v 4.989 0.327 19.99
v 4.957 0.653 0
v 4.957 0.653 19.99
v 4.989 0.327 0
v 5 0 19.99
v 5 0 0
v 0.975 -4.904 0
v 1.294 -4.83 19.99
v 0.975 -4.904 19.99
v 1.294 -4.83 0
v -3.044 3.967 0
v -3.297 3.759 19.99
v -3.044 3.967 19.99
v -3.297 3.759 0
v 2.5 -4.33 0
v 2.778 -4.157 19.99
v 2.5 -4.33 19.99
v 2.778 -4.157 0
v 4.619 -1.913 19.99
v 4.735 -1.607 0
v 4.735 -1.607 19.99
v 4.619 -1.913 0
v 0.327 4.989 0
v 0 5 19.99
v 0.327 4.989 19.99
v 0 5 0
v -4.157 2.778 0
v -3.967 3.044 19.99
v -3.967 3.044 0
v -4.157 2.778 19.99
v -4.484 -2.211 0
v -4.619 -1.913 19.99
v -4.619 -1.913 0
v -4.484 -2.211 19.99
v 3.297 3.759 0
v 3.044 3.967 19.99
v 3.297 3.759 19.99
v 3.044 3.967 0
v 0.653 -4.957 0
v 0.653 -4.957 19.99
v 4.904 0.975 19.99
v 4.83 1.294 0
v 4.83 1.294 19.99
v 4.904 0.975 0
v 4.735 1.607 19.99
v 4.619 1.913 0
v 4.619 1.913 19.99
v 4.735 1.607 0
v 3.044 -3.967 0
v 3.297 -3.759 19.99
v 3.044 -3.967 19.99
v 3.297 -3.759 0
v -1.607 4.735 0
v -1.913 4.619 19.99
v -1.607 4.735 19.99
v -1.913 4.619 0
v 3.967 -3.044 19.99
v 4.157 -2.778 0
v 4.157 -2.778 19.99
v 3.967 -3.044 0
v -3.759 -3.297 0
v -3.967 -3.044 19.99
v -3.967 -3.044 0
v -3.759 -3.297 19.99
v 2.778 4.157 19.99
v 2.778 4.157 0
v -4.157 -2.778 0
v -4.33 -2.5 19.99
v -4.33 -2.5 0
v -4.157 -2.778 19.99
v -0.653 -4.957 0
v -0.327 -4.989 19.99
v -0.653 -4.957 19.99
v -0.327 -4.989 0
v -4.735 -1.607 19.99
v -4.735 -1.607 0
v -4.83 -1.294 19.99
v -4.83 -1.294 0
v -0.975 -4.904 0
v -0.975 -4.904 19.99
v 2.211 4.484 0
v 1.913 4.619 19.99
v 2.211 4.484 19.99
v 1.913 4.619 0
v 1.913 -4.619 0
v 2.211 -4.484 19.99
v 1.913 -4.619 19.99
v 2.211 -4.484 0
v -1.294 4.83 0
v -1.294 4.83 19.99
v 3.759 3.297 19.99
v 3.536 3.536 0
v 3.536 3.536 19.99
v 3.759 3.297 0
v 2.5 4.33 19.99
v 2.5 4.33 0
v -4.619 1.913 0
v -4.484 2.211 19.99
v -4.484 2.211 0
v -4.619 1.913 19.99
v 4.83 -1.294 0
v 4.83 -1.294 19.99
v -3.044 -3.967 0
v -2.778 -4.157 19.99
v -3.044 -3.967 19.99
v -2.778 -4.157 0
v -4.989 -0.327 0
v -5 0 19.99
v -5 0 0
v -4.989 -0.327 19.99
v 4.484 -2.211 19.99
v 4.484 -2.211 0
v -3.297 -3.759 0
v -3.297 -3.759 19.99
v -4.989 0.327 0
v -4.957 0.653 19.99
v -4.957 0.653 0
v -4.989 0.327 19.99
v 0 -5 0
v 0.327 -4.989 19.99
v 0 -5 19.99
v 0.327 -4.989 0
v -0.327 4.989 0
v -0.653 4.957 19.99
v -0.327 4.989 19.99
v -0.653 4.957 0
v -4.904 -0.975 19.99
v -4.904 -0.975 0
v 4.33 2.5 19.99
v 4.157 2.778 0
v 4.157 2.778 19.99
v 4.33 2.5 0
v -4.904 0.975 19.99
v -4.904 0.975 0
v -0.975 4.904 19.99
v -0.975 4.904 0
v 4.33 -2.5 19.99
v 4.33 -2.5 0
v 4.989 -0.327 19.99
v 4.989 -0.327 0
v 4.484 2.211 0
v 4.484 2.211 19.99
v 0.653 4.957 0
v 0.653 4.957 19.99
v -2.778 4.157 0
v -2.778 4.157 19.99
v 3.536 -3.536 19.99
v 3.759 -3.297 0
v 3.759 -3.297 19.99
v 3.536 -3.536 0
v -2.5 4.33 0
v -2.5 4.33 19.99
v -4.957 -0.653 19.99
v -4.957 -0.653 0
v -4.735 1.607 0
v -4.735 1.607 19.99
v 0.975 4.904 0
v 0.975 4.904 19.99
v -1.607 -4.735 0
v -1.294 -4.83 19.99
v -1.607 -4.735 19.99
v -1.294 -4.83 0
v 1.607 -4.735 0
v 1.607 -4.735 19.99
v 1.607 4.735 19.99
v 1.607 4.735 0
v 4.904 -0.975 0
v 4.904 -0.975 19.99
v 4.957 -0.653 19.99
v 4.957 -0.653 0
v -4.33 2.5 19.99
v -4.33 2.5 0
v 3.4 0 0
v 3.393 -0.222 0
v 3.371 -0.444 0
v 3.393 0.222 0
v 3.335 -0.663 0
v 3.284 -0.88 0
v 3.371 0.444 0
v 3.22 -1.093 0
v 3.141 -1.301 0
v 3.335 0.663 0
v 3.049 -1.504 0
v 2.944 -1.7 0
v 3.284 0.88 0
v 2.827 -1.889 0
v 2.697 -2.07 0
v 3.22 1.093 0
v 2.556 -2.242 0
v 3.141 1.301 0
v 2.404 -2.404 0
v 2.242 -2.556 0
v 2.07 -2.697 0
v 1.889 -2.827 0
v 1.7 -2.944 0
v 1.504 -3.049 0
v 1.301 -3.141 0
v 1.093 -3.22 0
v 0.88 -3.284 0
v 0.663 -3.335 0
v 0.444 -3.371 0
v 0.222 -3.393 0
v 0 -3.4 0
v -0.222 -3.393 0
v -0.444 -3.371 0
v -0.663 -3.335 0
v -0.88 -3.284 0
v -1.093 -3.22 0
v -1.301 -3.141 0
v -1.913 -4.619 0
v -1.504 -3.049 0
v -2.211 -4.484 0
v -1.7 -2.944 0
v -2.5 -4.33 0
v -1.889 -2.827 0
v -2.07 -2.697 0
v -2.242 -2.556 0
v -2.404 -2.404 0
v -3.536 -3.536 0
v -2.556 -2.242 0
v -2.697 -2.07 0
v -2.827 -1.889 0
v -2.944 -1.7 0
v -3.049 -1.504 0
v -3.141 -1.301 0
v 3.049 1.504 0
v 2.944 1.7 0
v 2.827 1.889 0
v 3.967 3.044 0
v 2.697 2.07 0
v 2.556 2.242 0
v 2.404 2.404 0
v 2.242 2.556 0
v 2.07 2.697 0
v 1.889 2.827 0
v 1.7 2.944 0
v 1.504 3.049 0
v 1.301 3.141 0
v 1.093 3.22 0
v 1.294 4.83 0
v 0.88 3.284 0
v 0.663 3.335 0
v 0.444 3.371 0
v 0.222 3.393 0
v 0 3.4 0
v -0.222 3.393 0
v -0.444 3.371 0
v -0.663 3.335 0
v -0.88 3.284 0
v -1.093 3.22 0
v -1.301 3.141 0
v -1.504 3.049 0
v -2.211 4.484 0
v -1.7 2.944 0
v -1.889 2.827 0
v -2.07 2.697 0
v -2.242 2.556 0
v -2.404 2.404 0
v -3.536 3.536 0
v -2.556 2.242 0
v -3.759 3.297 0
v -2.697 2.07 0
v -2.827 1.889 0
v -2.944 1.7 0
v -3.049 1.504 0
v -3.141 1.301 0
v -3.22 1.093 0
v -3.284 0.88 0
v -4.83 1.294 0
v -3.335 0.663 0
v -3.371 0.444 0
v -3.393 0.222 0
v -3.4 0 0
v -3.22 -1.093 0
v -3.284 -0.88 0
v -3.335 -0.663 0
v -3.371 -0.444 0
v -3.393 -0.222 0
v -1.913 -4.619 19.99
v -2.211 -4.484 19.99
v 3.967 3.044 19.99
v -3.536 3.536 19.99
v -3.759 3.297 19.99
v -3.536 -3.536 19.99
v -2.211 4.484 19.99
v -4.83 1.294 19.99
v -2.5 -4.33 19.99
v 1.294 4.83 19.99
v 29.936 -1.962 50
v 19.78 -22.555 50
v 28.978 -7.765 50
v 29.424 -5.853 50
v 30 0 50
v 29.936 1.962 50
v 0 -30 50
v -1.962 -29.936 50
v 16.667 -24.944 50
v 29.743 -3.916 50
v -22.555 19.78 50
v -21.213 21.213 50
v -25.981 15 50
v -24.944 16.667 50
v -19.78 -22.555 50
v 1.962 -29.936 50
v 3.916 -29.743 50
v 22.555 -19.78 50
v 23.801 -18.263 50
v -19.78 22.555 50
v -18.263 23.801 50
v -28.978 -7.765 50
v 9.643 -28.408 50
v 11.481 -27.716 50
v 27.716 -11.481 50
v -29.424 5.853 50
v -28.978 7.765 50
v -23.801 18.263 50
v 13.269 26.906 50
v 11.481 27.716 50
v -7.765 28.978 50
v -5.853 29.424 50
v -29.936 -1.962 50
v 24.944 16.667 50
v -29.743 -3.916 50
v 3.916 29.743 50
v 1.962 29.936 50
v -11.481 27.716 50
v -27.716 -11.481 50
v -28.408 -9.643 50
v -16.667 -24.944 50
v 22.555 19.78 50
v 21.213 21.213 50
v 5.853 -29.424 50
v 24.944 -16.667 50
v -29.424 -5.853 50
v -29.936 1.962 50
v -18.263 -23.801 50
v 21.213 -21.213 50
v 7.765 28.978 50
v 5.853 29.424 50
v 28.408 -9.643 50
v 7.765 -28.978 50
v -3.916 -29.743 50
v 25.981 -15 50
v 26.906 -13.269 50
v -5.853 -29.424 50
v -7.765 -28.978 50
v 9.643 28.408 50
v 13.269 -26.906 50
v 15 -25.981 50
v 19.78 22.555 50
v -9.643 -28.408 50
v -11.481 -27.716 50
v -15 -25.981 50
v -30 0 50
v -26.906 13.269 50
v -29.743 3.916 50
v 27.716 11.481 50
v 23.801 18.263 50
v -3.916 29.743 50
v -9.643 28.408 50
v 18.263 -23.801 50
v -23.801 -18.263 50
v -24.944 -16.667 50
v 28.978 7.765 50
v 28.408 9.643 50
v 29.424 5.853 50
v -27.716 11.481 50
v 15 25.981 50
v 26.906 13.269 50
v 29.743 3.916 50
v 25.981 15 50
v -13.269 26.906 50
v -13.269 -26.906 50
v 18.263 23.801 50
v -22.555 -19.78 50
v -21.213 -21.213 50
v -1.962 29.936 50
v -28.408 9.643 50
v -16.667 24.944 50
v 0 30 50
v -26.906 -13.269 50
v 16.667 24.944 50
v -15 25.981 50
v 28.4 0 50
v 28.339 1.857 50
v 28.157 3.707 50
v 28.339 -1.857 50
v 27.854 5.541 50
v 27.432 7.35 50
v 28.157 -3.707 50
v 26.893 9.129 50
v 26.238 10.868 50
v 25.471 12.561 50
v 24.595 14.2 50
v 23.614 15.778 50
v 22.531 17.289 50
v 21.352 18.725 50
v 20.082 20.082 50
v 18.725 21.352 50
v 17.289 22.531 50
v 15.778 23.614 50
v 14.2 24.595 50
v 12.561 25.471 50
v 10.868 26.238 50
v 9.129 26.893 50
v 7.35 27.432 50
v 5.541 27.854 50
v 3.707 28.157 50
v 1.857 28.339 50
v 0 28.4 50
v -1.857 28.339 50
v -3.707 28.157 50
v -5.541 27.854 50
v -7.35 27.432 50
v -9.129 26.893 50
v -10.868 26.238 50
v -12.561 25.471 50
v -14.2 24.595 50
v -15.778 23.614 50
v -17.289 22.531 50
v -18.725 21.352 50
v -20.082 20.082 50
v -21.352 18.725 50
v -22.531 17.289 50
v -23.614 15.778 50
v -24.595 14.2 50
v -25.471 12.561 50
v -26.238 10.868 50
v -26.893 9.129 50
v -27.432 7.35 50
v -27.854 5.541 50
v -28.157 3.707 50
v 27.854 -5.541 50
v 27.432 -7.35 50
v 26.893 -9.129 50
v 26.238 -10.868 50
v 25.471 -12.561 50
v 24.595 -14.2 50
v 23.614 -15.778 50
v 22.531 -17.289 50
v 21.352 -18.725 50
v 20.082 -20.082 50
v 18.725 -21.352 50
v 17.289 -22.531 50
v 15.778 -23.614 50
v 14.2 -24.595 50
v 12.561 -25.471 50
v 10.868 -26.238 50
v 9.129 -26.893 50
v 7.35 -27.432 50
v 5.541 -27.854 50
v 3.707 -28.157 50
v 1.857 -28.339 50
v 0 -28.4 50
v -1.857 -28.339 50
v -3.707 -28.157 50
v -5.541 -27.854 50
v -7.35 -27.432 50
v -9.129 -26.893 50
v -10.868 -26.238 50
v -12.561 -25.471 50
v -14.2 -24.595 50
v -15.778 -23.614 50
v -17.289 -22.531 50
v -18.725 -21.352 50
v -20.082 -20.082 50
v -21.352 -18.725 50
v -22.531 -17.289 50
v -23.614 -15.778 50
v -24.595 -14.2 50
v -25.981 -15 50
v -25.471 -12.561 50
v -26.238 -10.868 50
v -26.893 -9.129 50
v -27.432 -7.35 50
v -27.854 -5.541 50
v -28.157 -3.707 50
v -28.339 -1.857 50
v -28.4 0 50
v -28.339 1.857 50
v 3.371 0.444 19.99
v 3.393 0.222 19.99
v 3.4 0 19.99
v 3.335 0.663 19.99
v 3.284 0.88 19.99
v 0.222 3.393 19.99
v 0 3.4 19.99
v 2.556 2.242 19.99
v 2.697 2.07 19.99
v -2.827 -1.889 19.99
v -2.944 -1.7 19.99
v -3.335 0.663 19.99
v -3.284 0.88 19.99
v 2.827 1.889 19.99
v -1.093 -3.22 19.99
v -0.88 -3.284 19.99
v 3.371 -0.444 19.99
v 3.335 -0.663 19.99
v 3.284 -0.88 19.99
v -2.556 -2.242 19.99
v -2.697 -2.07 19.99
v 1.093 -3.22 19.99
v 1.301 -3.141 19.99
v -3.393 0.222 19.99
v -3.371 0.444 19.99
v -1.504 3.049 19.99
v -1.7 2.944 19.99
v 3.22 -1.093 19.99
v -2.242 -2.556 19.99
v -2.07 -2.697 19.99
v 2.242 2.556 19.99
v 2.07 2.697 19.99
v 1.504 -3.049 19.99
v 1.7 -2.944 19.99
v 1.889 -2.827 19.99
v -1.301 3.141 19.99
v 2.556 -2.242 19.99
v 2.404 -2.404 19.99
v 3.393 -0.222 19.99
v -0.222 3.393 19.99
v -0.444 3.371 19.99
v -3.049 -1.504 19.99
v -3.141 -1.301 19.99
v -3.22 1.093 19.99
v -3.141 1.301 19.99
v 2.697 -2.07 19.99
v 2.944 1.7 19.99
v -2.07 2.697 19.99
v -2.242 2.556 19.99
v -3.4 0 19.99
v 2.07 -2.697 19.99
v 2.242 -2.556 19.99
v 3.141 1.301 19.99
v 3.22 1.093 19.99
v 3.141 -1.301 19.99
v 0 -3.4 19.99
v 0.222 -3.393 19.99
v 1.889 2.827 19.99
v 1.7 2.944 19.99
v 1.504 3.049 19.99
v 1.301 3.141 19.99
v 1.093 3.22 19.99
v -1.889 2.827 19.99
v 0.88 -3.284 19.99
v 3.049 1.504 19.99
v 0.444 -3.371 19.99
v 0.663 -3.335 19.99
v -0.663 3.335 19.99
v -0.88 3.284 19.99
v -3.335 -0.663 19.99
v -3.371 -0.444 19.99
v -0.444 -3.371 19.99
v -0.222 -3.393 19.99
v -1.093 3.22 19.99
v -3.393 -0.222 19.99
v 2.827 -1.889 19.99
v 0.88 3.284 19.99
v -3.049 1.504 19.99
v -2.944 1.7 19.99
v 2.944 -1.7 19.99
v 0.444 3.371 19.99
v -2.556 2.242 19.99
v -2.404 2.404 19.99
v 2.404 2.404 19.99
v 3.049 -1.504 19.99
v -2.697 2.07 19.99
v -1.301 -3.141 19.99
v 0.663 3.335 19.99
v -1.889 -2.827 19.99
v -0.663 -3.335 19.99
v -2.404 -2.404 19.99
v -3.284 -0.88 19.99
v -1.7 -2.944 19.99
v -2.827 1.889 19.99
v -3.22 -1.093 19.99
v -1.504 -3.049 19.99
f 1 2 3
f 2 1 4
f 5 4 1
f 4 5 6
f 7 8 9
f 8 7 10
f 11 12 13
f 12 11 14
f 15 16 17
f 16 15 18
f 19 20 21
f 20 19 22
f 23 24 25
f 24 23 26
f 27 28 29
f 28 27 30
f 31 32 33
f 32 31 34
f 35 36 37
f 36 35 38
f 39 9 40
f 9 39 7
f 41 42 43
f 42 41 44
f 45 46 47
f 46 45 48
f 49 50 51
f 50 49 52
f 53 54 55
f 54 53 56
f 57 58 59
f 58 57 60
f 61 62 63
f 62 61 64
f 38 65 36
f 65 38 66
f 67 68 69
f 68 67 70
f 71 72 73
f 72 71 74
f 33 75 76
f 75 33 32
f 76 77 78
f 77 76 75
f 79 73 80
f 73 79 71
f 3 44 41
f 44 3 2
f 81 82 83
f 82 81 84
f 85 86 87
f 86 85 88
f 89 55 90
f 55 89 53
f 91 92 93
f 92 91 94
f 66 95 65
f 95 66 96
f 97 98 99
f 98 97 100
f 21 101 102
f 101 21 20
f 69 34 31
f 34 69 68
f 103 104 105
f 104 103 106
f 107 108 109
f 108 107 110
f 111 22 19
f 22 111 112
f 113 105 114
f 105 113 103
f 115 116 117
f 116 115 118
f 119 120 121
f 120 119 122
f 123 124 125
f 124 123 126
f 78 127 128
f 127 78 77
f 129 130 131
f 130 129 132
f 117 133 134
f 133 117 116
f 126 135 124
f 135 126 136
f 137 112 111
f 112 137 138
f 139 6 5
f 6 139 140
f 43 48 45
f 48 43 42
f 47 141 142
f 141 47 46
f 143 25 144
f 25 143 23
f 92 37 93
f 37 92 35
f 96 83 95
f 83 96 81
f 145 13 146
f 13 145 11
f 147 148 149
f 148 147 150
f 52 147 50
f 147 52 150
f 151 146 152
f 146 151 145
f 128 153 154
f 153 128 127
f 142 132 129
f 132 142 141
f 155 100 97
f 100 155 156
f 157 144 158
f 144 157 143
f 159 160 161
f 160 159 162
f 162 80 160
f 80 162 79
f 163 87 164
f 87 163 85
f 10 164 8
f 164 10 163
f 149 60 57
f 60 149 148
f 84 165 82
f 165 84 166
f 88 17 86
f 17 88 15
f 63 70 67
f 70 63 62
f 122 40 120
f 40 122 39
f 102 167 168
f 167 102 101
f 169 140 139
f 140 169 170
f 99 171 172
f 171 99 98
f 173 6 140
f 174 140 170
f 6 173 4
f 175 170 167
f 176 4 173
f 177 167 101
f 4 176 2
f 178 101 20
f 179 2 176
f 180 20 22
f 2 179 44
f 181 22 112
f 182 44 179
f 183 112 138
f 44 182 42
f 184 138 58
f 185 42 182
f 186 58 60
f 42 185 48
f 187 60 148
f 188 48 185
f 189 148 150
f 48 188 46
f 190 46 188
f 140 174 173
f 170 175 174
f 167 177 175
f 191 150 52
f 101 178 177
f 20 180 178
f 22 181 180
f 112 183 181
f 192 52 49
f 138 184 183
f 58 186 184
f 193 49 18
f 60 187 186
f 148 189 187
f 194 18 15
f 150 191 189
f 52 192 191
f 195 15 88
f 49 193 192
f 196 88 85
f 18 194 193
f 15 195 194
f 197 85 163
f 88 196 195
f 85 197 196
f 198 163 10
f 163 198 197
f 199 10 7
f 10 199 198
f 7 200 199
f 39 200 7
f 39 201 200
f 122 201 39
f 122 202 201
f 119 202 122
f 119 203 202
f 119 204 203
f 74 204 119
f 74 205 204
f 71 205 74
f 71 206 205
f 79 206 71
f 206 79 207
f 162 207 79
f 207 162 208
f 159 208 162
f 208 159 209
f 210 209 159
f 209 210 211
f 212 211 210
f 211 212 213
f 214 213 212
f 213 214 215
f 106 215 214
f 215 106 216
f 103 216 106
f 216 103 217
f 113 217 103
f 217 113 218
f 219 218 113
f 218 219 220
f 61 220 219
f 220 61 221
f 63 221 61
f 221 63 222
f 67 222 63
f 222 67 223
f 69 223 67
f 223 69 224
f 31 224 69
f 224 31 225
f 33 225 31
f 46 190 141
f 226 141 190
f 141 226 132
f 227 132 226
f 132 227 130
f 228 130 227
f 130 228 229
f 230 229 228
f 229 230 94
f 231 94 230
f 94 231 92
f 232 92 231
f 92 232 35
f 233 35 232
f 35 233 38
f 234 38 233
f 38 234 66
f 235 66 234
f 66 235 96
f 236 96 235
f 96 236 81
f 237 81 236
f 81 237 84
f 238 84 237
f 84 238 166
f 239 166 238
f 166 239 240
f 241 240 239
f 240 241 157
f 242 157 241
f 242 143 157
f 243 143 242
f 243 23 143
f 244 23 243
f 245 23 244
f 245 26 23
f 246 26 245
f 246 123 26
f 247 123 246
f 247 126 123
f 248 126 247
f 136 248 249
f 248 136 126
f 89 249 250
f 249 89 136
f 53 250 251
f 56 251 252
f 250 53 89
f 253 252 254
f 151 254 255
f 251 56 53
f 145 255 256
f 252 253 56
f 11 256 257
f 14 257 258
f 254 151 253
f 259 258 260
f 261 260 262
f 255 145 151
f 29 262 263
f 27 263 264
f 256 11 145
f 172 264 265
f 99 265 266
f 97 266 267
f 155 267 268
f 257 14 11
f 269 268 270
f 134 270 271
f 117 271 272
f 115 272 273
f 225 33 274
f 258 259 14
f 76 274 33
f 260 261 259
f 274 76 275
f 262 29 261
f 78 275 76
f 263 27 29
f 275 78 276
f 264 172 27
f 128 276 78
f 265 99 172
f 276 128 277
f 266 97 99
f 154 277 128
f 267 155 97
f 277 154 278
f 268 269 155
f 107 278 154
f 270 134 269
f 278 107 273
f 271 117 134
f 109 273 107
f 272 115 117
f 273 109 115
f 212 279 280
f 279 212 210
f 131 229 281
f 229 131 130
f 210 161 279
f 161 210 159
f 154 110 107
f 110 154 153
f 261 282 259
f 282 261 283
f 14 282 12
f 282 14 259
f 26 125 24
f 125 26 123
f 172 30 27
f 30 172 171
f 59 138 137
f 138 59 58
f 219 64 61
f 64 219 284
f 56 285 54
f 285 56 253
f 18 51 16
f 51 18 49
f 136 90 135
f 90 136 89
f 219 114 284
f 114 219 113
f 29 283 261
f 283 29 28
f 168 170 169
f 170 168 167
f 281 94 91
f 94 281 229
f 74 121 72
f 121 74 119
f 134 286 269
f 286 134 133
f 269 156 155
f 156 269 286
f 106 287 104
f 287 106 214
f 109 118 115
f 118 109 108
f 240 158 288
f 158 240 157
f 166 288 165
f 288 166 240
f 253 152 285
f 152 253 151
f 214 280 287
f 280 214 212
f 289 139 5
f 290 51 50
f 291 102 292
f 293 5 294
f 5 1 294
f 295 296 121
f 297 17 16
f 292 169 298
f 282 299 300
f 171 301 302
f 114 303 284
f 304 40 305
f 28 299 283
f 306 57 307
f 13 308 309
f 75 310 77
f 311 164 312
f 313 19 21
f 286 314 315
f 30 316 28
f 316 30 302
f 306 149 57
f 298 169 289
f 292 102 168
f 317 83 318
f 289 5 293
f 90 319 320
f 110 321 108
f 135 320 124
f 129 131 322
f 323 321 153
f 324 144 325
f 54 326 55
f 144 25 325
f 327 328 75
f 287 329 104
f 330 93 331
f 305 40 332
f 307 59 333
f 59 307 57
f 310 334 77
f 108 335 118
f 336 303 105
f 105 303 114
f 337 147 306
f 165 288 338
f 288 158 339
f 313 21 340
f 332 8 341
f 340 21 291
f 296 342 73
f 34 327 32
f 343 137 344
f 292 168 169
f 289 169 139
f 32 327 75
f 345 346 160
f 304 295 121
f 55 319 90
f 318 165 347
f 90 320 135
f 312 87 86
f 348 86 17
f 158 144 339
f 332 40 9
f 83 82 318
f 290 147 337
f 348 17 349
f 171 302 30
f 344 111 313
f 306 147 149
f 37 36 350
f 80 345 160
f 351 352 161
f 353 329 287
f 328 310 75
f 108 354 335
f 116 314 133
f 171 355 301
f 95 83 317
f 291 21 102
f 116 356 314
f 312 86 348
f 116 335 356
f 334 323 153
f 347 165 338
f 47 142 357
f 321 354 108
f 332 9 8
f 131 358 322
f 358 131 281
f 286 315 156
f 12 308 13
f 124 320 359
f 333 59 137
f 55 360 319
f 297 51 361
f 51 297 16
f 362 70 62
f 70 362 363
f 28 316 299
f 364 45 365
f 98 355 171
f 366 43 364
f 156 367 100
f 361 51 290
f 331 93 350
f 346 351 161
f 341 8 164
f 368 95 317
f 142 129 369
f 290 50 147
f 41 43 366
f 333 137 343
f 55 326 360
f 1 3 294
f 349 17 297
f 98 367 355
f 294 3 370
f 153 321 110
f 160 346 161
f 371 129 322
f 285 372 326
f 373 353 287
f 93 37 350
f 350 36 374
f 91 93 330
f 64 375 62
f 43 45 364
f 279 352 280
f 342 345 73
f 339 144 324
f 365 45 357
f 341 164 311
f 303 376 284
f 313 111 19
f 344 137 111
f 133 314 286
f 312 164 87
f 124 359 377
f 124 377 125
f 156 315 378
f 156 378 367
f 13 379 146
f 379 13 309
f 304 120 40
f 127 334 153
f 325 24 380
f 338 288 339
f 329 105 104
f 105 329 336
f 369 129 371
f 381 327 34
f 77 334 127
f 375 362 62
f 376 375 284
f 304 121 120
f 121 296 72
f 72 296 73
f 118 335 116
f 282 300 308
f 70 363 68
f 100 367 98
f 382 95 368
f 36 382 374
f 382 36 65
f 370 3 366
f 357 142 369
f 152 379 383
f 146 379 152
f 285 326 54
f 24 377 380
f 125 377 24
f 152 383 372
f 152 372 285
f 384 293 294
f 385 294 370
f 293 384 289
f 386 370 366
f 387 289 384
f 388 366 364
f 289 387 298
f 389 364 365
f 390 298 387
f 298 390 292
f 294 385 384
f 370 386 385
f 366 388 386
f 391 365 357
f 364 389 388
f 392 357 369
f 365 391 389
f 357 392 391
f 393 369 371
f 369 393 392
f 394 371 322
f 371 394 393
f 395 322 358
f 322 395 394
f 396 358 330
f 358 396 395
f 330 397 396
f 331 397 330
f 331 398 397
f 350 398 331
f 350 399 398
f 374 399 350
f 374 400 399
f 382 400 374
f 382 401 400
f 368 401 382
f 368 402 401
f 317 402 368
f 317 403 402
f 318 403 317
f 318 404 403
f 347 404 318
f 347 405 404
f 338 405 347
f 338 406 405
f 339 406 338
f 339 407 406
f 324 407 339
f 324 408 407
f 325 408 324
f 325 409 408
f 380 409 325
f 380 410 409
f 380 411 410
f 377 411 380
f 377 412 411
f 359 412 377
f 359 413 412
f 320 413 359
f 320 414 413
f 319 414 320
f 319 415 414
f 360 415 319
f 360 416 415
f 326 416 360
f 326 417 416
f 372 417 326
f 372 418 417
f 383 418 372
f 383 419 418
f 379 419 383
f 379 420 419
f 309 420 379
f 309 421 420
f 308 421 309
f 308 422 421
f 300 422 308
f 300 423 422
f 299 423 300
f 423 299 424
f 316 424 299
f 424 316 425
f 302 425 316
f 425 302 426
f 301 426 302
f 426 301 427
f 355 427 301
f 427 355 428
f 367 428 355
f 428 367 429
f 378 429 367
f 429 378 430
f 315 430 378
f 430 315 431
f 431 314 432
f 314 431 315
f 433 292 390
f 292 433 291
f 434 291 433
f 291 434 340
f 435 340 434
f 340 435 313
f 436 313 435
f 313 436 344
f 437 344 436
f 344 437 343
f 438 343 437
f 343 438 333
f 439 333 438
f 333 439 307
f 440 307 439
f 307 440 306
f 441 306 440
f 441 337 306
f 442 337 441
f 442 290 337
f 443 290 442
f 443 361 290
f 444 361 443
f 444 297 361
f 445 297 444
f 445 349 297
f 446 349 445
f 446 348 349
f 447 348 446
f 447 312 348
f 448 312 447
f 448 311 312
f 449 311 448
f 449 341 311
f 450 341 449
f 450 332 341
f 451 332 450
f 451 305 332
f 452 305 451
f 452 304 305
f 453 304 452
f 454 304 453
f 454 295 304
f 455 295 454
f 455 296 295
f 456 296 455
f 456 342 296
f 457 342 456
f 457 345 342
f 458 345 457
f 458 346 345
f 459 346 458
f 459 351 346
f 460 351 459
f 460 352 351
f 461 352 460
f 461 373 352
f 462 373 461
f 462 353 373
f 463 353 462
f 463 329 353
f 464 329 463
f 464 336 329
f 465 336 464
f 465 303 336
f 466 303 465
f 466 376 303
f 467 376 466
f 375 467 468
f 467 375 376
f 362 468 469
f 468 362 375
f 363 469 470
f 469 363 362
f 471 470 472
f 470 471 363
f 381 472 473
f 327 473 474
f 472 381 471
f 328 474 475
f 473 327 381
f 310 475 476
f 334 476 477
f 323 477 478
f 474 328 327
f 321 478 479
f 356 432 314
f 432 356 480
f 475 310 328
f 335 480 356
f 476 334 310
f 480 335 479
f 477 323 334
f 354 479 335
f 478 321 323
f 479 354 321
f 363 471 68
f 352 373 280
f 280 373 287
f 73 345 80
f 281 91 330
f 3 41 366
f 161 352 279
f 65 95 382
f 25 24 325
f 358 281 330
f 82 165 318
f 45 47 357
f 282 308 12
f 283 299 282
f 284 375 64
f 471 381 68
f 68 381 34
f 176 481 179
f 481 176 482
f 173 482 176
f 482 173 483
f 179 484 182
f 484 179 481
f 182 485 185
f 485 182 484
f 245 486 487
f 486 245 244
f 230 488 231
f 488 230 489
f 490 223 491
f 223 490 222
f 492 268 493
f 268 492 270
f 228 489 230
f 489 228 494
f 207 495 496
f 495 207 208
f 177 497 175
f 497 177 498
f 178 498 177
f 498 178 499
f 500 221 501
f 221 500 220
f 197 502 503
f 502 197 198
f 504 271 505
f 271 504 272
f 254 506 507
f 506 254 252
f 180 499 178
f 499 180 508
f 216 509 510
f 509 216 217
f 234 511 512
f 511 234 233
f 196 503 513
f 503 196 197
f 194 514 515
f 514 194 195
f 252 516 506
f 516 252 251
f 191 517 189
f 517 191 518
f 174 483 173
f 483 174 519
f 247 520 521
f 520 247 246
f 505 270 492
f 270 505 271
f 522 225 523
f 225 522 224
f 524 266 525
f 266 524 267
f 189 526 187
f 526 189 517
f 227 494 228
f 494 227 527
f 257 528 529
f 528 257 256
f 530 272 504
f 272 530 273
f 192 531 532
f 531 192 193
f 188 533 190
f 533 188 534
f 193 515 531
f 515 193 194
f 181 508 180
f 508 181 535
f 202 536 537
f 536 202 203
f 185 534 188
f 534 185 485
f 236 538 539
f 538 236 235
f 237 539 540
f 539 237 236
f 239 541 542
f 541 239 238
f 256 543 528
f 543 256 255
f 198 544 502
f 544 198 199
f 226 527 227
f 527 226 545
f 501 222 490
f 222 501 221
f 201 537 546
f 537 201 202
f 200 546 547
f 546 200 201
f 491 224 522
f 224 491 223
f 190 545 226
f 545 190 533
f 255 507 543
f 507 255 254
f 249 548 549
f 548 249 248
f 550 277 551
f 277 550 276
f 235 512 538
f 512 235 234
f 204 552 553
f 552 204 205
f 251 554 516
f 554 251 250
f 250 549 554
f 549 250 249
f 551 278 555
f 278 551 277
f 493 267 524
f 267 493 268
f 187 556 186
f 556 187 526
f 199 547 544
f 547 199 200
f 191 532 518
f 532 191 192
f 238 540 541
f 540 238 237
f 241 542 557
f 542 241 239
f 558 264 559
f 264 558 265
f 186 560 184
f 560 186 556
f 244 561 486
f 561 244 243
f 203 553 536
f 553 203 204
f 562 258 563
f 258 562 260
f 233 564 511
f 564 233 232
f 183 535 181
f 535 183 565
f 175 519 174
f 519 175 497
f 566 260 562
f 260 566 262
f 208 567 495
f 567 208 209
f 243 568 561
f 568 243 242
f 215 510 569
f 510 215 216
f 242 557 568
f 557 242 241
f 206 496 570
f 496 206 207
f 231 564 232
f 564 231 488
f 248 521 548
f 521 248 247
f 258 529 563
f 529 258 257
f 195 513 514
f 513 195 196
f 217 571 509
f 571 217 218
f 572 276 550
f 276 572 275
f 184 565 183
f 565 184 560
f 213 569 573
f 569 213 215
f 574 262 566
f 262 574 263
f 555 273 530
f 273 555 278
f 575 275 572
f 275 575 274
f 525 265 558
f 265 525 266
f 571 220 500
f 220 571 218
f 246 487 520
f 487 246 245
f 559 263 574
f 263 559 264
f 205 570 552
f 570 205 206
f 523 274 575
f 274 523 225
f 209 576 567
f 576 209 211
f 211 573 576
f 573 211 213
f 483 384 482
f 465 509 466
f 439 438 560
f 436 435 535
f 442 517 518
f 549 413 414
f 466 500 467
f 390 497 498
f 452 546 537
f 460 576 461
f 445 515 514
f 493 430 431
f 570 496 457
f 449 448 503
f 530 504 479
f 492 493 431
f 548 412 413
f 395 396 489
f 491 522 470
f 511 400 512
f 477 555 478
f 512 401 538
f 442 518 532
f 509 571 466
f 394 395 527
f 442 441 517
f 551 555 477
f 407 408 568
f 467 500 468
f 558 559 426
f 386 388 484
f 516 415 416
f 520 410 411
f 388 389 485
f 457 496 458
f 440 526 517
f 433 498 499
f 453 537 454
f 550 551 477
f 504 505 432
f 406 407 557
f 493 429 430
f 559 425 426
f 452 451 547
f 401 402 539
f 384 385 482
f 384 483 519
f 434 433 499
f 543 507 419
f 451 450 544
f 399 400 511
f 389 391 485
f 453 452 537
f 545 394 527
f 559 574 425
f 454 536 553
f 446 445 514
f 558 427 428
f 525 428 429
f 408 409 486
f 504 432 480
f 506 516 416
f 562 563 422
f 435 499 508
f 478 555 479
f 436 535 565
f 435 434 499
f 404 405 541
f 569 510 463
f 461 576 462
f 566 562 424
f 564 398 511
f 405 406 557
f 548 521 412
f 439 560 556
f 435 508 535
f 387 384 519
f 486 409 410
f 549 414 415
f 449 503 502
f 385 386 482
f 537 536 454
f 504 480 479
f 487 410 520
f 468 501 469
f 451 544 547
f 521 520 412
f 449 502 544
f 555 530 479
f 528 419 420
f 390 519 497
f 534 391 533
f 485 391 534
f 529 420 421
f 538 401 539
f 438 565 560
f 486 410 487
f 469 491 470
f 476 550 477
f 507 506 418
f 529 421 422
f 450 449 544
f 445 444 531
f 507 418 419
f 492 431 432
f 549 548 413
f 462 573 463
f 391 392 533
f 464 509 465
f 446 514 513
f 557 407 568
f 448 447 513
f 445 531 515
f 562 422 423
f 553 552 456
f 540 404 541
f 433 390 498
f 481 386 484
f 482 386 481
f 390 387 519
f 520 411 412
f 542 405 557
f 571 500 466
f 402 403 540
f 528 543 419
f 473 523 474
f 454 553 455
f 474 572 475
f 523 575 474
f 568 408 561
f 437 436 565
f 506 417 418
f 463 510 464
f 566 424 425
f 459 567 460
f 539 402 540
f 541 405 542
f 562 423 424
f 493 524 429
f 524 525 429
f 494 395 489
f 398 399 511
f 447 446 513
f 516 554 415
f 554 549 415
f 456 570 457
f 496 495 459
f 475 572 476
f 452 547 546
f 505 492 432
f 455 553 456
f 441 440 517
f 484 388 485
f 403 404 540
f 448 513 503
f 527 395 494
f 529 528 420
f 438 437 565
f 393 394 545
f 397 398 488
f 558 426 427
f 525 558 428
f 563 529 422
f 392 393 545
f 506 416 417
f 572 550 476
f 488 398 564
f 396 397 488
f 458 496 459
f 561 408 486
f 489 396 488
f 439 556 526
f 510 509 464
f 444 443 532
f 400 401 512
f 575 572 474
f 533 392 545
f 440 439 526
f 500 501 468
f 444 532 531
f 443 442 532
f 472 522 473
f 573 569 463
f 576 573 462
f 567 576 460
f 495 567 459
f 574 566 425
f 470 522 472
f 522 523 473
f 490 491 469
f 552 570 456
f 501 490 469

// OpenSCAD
// Lab funnel - printed upright, open at top and bottom
// Units: mm

// ---- Parameters ----
spout_od      = 10;    // spout outer diameter (z = 0 to 20)
spout_length  = 20;    // spout length
cone_top_d    = 10;    // cone diameter where it meets the spout (z = 20)
cone_rim_d    = 60;    // cone rim diameter (z = 50)
cone_height   = 30;    // cone height (z = 20 to 50)
wall          = 1.6;   // wall thickness everywhere
eps           = 0.5;   // cutter overshoot past faces

$fn = 96;

// ---- Model ----
difference() {
    union() {
        // Straight spout
        cylinder(d = spout_od, h = spout_length);
        // Cone (slightly overlapping the spout for a clean union)
        translate([0, 0, spout_length - 0.01])
            cylinder(d1 = cone_top_d, d2 = cone_rim_d, h = cone_height + 0.01);
    }
    // Through-bore: spout bore extends into the cone, cone bore up to the rim
    translate([0, 0, -eps])
        cylinder(d = spout_od - 2 * wall, h = spout_length + 2 * eps);
    translate([0, 0, spout_length - 0.01])
        cylinder(d1 = cone_top_d - 2 * wall, d2 = cone_rim_d - 2 * wall, h = cone_height + 0.01);
}
